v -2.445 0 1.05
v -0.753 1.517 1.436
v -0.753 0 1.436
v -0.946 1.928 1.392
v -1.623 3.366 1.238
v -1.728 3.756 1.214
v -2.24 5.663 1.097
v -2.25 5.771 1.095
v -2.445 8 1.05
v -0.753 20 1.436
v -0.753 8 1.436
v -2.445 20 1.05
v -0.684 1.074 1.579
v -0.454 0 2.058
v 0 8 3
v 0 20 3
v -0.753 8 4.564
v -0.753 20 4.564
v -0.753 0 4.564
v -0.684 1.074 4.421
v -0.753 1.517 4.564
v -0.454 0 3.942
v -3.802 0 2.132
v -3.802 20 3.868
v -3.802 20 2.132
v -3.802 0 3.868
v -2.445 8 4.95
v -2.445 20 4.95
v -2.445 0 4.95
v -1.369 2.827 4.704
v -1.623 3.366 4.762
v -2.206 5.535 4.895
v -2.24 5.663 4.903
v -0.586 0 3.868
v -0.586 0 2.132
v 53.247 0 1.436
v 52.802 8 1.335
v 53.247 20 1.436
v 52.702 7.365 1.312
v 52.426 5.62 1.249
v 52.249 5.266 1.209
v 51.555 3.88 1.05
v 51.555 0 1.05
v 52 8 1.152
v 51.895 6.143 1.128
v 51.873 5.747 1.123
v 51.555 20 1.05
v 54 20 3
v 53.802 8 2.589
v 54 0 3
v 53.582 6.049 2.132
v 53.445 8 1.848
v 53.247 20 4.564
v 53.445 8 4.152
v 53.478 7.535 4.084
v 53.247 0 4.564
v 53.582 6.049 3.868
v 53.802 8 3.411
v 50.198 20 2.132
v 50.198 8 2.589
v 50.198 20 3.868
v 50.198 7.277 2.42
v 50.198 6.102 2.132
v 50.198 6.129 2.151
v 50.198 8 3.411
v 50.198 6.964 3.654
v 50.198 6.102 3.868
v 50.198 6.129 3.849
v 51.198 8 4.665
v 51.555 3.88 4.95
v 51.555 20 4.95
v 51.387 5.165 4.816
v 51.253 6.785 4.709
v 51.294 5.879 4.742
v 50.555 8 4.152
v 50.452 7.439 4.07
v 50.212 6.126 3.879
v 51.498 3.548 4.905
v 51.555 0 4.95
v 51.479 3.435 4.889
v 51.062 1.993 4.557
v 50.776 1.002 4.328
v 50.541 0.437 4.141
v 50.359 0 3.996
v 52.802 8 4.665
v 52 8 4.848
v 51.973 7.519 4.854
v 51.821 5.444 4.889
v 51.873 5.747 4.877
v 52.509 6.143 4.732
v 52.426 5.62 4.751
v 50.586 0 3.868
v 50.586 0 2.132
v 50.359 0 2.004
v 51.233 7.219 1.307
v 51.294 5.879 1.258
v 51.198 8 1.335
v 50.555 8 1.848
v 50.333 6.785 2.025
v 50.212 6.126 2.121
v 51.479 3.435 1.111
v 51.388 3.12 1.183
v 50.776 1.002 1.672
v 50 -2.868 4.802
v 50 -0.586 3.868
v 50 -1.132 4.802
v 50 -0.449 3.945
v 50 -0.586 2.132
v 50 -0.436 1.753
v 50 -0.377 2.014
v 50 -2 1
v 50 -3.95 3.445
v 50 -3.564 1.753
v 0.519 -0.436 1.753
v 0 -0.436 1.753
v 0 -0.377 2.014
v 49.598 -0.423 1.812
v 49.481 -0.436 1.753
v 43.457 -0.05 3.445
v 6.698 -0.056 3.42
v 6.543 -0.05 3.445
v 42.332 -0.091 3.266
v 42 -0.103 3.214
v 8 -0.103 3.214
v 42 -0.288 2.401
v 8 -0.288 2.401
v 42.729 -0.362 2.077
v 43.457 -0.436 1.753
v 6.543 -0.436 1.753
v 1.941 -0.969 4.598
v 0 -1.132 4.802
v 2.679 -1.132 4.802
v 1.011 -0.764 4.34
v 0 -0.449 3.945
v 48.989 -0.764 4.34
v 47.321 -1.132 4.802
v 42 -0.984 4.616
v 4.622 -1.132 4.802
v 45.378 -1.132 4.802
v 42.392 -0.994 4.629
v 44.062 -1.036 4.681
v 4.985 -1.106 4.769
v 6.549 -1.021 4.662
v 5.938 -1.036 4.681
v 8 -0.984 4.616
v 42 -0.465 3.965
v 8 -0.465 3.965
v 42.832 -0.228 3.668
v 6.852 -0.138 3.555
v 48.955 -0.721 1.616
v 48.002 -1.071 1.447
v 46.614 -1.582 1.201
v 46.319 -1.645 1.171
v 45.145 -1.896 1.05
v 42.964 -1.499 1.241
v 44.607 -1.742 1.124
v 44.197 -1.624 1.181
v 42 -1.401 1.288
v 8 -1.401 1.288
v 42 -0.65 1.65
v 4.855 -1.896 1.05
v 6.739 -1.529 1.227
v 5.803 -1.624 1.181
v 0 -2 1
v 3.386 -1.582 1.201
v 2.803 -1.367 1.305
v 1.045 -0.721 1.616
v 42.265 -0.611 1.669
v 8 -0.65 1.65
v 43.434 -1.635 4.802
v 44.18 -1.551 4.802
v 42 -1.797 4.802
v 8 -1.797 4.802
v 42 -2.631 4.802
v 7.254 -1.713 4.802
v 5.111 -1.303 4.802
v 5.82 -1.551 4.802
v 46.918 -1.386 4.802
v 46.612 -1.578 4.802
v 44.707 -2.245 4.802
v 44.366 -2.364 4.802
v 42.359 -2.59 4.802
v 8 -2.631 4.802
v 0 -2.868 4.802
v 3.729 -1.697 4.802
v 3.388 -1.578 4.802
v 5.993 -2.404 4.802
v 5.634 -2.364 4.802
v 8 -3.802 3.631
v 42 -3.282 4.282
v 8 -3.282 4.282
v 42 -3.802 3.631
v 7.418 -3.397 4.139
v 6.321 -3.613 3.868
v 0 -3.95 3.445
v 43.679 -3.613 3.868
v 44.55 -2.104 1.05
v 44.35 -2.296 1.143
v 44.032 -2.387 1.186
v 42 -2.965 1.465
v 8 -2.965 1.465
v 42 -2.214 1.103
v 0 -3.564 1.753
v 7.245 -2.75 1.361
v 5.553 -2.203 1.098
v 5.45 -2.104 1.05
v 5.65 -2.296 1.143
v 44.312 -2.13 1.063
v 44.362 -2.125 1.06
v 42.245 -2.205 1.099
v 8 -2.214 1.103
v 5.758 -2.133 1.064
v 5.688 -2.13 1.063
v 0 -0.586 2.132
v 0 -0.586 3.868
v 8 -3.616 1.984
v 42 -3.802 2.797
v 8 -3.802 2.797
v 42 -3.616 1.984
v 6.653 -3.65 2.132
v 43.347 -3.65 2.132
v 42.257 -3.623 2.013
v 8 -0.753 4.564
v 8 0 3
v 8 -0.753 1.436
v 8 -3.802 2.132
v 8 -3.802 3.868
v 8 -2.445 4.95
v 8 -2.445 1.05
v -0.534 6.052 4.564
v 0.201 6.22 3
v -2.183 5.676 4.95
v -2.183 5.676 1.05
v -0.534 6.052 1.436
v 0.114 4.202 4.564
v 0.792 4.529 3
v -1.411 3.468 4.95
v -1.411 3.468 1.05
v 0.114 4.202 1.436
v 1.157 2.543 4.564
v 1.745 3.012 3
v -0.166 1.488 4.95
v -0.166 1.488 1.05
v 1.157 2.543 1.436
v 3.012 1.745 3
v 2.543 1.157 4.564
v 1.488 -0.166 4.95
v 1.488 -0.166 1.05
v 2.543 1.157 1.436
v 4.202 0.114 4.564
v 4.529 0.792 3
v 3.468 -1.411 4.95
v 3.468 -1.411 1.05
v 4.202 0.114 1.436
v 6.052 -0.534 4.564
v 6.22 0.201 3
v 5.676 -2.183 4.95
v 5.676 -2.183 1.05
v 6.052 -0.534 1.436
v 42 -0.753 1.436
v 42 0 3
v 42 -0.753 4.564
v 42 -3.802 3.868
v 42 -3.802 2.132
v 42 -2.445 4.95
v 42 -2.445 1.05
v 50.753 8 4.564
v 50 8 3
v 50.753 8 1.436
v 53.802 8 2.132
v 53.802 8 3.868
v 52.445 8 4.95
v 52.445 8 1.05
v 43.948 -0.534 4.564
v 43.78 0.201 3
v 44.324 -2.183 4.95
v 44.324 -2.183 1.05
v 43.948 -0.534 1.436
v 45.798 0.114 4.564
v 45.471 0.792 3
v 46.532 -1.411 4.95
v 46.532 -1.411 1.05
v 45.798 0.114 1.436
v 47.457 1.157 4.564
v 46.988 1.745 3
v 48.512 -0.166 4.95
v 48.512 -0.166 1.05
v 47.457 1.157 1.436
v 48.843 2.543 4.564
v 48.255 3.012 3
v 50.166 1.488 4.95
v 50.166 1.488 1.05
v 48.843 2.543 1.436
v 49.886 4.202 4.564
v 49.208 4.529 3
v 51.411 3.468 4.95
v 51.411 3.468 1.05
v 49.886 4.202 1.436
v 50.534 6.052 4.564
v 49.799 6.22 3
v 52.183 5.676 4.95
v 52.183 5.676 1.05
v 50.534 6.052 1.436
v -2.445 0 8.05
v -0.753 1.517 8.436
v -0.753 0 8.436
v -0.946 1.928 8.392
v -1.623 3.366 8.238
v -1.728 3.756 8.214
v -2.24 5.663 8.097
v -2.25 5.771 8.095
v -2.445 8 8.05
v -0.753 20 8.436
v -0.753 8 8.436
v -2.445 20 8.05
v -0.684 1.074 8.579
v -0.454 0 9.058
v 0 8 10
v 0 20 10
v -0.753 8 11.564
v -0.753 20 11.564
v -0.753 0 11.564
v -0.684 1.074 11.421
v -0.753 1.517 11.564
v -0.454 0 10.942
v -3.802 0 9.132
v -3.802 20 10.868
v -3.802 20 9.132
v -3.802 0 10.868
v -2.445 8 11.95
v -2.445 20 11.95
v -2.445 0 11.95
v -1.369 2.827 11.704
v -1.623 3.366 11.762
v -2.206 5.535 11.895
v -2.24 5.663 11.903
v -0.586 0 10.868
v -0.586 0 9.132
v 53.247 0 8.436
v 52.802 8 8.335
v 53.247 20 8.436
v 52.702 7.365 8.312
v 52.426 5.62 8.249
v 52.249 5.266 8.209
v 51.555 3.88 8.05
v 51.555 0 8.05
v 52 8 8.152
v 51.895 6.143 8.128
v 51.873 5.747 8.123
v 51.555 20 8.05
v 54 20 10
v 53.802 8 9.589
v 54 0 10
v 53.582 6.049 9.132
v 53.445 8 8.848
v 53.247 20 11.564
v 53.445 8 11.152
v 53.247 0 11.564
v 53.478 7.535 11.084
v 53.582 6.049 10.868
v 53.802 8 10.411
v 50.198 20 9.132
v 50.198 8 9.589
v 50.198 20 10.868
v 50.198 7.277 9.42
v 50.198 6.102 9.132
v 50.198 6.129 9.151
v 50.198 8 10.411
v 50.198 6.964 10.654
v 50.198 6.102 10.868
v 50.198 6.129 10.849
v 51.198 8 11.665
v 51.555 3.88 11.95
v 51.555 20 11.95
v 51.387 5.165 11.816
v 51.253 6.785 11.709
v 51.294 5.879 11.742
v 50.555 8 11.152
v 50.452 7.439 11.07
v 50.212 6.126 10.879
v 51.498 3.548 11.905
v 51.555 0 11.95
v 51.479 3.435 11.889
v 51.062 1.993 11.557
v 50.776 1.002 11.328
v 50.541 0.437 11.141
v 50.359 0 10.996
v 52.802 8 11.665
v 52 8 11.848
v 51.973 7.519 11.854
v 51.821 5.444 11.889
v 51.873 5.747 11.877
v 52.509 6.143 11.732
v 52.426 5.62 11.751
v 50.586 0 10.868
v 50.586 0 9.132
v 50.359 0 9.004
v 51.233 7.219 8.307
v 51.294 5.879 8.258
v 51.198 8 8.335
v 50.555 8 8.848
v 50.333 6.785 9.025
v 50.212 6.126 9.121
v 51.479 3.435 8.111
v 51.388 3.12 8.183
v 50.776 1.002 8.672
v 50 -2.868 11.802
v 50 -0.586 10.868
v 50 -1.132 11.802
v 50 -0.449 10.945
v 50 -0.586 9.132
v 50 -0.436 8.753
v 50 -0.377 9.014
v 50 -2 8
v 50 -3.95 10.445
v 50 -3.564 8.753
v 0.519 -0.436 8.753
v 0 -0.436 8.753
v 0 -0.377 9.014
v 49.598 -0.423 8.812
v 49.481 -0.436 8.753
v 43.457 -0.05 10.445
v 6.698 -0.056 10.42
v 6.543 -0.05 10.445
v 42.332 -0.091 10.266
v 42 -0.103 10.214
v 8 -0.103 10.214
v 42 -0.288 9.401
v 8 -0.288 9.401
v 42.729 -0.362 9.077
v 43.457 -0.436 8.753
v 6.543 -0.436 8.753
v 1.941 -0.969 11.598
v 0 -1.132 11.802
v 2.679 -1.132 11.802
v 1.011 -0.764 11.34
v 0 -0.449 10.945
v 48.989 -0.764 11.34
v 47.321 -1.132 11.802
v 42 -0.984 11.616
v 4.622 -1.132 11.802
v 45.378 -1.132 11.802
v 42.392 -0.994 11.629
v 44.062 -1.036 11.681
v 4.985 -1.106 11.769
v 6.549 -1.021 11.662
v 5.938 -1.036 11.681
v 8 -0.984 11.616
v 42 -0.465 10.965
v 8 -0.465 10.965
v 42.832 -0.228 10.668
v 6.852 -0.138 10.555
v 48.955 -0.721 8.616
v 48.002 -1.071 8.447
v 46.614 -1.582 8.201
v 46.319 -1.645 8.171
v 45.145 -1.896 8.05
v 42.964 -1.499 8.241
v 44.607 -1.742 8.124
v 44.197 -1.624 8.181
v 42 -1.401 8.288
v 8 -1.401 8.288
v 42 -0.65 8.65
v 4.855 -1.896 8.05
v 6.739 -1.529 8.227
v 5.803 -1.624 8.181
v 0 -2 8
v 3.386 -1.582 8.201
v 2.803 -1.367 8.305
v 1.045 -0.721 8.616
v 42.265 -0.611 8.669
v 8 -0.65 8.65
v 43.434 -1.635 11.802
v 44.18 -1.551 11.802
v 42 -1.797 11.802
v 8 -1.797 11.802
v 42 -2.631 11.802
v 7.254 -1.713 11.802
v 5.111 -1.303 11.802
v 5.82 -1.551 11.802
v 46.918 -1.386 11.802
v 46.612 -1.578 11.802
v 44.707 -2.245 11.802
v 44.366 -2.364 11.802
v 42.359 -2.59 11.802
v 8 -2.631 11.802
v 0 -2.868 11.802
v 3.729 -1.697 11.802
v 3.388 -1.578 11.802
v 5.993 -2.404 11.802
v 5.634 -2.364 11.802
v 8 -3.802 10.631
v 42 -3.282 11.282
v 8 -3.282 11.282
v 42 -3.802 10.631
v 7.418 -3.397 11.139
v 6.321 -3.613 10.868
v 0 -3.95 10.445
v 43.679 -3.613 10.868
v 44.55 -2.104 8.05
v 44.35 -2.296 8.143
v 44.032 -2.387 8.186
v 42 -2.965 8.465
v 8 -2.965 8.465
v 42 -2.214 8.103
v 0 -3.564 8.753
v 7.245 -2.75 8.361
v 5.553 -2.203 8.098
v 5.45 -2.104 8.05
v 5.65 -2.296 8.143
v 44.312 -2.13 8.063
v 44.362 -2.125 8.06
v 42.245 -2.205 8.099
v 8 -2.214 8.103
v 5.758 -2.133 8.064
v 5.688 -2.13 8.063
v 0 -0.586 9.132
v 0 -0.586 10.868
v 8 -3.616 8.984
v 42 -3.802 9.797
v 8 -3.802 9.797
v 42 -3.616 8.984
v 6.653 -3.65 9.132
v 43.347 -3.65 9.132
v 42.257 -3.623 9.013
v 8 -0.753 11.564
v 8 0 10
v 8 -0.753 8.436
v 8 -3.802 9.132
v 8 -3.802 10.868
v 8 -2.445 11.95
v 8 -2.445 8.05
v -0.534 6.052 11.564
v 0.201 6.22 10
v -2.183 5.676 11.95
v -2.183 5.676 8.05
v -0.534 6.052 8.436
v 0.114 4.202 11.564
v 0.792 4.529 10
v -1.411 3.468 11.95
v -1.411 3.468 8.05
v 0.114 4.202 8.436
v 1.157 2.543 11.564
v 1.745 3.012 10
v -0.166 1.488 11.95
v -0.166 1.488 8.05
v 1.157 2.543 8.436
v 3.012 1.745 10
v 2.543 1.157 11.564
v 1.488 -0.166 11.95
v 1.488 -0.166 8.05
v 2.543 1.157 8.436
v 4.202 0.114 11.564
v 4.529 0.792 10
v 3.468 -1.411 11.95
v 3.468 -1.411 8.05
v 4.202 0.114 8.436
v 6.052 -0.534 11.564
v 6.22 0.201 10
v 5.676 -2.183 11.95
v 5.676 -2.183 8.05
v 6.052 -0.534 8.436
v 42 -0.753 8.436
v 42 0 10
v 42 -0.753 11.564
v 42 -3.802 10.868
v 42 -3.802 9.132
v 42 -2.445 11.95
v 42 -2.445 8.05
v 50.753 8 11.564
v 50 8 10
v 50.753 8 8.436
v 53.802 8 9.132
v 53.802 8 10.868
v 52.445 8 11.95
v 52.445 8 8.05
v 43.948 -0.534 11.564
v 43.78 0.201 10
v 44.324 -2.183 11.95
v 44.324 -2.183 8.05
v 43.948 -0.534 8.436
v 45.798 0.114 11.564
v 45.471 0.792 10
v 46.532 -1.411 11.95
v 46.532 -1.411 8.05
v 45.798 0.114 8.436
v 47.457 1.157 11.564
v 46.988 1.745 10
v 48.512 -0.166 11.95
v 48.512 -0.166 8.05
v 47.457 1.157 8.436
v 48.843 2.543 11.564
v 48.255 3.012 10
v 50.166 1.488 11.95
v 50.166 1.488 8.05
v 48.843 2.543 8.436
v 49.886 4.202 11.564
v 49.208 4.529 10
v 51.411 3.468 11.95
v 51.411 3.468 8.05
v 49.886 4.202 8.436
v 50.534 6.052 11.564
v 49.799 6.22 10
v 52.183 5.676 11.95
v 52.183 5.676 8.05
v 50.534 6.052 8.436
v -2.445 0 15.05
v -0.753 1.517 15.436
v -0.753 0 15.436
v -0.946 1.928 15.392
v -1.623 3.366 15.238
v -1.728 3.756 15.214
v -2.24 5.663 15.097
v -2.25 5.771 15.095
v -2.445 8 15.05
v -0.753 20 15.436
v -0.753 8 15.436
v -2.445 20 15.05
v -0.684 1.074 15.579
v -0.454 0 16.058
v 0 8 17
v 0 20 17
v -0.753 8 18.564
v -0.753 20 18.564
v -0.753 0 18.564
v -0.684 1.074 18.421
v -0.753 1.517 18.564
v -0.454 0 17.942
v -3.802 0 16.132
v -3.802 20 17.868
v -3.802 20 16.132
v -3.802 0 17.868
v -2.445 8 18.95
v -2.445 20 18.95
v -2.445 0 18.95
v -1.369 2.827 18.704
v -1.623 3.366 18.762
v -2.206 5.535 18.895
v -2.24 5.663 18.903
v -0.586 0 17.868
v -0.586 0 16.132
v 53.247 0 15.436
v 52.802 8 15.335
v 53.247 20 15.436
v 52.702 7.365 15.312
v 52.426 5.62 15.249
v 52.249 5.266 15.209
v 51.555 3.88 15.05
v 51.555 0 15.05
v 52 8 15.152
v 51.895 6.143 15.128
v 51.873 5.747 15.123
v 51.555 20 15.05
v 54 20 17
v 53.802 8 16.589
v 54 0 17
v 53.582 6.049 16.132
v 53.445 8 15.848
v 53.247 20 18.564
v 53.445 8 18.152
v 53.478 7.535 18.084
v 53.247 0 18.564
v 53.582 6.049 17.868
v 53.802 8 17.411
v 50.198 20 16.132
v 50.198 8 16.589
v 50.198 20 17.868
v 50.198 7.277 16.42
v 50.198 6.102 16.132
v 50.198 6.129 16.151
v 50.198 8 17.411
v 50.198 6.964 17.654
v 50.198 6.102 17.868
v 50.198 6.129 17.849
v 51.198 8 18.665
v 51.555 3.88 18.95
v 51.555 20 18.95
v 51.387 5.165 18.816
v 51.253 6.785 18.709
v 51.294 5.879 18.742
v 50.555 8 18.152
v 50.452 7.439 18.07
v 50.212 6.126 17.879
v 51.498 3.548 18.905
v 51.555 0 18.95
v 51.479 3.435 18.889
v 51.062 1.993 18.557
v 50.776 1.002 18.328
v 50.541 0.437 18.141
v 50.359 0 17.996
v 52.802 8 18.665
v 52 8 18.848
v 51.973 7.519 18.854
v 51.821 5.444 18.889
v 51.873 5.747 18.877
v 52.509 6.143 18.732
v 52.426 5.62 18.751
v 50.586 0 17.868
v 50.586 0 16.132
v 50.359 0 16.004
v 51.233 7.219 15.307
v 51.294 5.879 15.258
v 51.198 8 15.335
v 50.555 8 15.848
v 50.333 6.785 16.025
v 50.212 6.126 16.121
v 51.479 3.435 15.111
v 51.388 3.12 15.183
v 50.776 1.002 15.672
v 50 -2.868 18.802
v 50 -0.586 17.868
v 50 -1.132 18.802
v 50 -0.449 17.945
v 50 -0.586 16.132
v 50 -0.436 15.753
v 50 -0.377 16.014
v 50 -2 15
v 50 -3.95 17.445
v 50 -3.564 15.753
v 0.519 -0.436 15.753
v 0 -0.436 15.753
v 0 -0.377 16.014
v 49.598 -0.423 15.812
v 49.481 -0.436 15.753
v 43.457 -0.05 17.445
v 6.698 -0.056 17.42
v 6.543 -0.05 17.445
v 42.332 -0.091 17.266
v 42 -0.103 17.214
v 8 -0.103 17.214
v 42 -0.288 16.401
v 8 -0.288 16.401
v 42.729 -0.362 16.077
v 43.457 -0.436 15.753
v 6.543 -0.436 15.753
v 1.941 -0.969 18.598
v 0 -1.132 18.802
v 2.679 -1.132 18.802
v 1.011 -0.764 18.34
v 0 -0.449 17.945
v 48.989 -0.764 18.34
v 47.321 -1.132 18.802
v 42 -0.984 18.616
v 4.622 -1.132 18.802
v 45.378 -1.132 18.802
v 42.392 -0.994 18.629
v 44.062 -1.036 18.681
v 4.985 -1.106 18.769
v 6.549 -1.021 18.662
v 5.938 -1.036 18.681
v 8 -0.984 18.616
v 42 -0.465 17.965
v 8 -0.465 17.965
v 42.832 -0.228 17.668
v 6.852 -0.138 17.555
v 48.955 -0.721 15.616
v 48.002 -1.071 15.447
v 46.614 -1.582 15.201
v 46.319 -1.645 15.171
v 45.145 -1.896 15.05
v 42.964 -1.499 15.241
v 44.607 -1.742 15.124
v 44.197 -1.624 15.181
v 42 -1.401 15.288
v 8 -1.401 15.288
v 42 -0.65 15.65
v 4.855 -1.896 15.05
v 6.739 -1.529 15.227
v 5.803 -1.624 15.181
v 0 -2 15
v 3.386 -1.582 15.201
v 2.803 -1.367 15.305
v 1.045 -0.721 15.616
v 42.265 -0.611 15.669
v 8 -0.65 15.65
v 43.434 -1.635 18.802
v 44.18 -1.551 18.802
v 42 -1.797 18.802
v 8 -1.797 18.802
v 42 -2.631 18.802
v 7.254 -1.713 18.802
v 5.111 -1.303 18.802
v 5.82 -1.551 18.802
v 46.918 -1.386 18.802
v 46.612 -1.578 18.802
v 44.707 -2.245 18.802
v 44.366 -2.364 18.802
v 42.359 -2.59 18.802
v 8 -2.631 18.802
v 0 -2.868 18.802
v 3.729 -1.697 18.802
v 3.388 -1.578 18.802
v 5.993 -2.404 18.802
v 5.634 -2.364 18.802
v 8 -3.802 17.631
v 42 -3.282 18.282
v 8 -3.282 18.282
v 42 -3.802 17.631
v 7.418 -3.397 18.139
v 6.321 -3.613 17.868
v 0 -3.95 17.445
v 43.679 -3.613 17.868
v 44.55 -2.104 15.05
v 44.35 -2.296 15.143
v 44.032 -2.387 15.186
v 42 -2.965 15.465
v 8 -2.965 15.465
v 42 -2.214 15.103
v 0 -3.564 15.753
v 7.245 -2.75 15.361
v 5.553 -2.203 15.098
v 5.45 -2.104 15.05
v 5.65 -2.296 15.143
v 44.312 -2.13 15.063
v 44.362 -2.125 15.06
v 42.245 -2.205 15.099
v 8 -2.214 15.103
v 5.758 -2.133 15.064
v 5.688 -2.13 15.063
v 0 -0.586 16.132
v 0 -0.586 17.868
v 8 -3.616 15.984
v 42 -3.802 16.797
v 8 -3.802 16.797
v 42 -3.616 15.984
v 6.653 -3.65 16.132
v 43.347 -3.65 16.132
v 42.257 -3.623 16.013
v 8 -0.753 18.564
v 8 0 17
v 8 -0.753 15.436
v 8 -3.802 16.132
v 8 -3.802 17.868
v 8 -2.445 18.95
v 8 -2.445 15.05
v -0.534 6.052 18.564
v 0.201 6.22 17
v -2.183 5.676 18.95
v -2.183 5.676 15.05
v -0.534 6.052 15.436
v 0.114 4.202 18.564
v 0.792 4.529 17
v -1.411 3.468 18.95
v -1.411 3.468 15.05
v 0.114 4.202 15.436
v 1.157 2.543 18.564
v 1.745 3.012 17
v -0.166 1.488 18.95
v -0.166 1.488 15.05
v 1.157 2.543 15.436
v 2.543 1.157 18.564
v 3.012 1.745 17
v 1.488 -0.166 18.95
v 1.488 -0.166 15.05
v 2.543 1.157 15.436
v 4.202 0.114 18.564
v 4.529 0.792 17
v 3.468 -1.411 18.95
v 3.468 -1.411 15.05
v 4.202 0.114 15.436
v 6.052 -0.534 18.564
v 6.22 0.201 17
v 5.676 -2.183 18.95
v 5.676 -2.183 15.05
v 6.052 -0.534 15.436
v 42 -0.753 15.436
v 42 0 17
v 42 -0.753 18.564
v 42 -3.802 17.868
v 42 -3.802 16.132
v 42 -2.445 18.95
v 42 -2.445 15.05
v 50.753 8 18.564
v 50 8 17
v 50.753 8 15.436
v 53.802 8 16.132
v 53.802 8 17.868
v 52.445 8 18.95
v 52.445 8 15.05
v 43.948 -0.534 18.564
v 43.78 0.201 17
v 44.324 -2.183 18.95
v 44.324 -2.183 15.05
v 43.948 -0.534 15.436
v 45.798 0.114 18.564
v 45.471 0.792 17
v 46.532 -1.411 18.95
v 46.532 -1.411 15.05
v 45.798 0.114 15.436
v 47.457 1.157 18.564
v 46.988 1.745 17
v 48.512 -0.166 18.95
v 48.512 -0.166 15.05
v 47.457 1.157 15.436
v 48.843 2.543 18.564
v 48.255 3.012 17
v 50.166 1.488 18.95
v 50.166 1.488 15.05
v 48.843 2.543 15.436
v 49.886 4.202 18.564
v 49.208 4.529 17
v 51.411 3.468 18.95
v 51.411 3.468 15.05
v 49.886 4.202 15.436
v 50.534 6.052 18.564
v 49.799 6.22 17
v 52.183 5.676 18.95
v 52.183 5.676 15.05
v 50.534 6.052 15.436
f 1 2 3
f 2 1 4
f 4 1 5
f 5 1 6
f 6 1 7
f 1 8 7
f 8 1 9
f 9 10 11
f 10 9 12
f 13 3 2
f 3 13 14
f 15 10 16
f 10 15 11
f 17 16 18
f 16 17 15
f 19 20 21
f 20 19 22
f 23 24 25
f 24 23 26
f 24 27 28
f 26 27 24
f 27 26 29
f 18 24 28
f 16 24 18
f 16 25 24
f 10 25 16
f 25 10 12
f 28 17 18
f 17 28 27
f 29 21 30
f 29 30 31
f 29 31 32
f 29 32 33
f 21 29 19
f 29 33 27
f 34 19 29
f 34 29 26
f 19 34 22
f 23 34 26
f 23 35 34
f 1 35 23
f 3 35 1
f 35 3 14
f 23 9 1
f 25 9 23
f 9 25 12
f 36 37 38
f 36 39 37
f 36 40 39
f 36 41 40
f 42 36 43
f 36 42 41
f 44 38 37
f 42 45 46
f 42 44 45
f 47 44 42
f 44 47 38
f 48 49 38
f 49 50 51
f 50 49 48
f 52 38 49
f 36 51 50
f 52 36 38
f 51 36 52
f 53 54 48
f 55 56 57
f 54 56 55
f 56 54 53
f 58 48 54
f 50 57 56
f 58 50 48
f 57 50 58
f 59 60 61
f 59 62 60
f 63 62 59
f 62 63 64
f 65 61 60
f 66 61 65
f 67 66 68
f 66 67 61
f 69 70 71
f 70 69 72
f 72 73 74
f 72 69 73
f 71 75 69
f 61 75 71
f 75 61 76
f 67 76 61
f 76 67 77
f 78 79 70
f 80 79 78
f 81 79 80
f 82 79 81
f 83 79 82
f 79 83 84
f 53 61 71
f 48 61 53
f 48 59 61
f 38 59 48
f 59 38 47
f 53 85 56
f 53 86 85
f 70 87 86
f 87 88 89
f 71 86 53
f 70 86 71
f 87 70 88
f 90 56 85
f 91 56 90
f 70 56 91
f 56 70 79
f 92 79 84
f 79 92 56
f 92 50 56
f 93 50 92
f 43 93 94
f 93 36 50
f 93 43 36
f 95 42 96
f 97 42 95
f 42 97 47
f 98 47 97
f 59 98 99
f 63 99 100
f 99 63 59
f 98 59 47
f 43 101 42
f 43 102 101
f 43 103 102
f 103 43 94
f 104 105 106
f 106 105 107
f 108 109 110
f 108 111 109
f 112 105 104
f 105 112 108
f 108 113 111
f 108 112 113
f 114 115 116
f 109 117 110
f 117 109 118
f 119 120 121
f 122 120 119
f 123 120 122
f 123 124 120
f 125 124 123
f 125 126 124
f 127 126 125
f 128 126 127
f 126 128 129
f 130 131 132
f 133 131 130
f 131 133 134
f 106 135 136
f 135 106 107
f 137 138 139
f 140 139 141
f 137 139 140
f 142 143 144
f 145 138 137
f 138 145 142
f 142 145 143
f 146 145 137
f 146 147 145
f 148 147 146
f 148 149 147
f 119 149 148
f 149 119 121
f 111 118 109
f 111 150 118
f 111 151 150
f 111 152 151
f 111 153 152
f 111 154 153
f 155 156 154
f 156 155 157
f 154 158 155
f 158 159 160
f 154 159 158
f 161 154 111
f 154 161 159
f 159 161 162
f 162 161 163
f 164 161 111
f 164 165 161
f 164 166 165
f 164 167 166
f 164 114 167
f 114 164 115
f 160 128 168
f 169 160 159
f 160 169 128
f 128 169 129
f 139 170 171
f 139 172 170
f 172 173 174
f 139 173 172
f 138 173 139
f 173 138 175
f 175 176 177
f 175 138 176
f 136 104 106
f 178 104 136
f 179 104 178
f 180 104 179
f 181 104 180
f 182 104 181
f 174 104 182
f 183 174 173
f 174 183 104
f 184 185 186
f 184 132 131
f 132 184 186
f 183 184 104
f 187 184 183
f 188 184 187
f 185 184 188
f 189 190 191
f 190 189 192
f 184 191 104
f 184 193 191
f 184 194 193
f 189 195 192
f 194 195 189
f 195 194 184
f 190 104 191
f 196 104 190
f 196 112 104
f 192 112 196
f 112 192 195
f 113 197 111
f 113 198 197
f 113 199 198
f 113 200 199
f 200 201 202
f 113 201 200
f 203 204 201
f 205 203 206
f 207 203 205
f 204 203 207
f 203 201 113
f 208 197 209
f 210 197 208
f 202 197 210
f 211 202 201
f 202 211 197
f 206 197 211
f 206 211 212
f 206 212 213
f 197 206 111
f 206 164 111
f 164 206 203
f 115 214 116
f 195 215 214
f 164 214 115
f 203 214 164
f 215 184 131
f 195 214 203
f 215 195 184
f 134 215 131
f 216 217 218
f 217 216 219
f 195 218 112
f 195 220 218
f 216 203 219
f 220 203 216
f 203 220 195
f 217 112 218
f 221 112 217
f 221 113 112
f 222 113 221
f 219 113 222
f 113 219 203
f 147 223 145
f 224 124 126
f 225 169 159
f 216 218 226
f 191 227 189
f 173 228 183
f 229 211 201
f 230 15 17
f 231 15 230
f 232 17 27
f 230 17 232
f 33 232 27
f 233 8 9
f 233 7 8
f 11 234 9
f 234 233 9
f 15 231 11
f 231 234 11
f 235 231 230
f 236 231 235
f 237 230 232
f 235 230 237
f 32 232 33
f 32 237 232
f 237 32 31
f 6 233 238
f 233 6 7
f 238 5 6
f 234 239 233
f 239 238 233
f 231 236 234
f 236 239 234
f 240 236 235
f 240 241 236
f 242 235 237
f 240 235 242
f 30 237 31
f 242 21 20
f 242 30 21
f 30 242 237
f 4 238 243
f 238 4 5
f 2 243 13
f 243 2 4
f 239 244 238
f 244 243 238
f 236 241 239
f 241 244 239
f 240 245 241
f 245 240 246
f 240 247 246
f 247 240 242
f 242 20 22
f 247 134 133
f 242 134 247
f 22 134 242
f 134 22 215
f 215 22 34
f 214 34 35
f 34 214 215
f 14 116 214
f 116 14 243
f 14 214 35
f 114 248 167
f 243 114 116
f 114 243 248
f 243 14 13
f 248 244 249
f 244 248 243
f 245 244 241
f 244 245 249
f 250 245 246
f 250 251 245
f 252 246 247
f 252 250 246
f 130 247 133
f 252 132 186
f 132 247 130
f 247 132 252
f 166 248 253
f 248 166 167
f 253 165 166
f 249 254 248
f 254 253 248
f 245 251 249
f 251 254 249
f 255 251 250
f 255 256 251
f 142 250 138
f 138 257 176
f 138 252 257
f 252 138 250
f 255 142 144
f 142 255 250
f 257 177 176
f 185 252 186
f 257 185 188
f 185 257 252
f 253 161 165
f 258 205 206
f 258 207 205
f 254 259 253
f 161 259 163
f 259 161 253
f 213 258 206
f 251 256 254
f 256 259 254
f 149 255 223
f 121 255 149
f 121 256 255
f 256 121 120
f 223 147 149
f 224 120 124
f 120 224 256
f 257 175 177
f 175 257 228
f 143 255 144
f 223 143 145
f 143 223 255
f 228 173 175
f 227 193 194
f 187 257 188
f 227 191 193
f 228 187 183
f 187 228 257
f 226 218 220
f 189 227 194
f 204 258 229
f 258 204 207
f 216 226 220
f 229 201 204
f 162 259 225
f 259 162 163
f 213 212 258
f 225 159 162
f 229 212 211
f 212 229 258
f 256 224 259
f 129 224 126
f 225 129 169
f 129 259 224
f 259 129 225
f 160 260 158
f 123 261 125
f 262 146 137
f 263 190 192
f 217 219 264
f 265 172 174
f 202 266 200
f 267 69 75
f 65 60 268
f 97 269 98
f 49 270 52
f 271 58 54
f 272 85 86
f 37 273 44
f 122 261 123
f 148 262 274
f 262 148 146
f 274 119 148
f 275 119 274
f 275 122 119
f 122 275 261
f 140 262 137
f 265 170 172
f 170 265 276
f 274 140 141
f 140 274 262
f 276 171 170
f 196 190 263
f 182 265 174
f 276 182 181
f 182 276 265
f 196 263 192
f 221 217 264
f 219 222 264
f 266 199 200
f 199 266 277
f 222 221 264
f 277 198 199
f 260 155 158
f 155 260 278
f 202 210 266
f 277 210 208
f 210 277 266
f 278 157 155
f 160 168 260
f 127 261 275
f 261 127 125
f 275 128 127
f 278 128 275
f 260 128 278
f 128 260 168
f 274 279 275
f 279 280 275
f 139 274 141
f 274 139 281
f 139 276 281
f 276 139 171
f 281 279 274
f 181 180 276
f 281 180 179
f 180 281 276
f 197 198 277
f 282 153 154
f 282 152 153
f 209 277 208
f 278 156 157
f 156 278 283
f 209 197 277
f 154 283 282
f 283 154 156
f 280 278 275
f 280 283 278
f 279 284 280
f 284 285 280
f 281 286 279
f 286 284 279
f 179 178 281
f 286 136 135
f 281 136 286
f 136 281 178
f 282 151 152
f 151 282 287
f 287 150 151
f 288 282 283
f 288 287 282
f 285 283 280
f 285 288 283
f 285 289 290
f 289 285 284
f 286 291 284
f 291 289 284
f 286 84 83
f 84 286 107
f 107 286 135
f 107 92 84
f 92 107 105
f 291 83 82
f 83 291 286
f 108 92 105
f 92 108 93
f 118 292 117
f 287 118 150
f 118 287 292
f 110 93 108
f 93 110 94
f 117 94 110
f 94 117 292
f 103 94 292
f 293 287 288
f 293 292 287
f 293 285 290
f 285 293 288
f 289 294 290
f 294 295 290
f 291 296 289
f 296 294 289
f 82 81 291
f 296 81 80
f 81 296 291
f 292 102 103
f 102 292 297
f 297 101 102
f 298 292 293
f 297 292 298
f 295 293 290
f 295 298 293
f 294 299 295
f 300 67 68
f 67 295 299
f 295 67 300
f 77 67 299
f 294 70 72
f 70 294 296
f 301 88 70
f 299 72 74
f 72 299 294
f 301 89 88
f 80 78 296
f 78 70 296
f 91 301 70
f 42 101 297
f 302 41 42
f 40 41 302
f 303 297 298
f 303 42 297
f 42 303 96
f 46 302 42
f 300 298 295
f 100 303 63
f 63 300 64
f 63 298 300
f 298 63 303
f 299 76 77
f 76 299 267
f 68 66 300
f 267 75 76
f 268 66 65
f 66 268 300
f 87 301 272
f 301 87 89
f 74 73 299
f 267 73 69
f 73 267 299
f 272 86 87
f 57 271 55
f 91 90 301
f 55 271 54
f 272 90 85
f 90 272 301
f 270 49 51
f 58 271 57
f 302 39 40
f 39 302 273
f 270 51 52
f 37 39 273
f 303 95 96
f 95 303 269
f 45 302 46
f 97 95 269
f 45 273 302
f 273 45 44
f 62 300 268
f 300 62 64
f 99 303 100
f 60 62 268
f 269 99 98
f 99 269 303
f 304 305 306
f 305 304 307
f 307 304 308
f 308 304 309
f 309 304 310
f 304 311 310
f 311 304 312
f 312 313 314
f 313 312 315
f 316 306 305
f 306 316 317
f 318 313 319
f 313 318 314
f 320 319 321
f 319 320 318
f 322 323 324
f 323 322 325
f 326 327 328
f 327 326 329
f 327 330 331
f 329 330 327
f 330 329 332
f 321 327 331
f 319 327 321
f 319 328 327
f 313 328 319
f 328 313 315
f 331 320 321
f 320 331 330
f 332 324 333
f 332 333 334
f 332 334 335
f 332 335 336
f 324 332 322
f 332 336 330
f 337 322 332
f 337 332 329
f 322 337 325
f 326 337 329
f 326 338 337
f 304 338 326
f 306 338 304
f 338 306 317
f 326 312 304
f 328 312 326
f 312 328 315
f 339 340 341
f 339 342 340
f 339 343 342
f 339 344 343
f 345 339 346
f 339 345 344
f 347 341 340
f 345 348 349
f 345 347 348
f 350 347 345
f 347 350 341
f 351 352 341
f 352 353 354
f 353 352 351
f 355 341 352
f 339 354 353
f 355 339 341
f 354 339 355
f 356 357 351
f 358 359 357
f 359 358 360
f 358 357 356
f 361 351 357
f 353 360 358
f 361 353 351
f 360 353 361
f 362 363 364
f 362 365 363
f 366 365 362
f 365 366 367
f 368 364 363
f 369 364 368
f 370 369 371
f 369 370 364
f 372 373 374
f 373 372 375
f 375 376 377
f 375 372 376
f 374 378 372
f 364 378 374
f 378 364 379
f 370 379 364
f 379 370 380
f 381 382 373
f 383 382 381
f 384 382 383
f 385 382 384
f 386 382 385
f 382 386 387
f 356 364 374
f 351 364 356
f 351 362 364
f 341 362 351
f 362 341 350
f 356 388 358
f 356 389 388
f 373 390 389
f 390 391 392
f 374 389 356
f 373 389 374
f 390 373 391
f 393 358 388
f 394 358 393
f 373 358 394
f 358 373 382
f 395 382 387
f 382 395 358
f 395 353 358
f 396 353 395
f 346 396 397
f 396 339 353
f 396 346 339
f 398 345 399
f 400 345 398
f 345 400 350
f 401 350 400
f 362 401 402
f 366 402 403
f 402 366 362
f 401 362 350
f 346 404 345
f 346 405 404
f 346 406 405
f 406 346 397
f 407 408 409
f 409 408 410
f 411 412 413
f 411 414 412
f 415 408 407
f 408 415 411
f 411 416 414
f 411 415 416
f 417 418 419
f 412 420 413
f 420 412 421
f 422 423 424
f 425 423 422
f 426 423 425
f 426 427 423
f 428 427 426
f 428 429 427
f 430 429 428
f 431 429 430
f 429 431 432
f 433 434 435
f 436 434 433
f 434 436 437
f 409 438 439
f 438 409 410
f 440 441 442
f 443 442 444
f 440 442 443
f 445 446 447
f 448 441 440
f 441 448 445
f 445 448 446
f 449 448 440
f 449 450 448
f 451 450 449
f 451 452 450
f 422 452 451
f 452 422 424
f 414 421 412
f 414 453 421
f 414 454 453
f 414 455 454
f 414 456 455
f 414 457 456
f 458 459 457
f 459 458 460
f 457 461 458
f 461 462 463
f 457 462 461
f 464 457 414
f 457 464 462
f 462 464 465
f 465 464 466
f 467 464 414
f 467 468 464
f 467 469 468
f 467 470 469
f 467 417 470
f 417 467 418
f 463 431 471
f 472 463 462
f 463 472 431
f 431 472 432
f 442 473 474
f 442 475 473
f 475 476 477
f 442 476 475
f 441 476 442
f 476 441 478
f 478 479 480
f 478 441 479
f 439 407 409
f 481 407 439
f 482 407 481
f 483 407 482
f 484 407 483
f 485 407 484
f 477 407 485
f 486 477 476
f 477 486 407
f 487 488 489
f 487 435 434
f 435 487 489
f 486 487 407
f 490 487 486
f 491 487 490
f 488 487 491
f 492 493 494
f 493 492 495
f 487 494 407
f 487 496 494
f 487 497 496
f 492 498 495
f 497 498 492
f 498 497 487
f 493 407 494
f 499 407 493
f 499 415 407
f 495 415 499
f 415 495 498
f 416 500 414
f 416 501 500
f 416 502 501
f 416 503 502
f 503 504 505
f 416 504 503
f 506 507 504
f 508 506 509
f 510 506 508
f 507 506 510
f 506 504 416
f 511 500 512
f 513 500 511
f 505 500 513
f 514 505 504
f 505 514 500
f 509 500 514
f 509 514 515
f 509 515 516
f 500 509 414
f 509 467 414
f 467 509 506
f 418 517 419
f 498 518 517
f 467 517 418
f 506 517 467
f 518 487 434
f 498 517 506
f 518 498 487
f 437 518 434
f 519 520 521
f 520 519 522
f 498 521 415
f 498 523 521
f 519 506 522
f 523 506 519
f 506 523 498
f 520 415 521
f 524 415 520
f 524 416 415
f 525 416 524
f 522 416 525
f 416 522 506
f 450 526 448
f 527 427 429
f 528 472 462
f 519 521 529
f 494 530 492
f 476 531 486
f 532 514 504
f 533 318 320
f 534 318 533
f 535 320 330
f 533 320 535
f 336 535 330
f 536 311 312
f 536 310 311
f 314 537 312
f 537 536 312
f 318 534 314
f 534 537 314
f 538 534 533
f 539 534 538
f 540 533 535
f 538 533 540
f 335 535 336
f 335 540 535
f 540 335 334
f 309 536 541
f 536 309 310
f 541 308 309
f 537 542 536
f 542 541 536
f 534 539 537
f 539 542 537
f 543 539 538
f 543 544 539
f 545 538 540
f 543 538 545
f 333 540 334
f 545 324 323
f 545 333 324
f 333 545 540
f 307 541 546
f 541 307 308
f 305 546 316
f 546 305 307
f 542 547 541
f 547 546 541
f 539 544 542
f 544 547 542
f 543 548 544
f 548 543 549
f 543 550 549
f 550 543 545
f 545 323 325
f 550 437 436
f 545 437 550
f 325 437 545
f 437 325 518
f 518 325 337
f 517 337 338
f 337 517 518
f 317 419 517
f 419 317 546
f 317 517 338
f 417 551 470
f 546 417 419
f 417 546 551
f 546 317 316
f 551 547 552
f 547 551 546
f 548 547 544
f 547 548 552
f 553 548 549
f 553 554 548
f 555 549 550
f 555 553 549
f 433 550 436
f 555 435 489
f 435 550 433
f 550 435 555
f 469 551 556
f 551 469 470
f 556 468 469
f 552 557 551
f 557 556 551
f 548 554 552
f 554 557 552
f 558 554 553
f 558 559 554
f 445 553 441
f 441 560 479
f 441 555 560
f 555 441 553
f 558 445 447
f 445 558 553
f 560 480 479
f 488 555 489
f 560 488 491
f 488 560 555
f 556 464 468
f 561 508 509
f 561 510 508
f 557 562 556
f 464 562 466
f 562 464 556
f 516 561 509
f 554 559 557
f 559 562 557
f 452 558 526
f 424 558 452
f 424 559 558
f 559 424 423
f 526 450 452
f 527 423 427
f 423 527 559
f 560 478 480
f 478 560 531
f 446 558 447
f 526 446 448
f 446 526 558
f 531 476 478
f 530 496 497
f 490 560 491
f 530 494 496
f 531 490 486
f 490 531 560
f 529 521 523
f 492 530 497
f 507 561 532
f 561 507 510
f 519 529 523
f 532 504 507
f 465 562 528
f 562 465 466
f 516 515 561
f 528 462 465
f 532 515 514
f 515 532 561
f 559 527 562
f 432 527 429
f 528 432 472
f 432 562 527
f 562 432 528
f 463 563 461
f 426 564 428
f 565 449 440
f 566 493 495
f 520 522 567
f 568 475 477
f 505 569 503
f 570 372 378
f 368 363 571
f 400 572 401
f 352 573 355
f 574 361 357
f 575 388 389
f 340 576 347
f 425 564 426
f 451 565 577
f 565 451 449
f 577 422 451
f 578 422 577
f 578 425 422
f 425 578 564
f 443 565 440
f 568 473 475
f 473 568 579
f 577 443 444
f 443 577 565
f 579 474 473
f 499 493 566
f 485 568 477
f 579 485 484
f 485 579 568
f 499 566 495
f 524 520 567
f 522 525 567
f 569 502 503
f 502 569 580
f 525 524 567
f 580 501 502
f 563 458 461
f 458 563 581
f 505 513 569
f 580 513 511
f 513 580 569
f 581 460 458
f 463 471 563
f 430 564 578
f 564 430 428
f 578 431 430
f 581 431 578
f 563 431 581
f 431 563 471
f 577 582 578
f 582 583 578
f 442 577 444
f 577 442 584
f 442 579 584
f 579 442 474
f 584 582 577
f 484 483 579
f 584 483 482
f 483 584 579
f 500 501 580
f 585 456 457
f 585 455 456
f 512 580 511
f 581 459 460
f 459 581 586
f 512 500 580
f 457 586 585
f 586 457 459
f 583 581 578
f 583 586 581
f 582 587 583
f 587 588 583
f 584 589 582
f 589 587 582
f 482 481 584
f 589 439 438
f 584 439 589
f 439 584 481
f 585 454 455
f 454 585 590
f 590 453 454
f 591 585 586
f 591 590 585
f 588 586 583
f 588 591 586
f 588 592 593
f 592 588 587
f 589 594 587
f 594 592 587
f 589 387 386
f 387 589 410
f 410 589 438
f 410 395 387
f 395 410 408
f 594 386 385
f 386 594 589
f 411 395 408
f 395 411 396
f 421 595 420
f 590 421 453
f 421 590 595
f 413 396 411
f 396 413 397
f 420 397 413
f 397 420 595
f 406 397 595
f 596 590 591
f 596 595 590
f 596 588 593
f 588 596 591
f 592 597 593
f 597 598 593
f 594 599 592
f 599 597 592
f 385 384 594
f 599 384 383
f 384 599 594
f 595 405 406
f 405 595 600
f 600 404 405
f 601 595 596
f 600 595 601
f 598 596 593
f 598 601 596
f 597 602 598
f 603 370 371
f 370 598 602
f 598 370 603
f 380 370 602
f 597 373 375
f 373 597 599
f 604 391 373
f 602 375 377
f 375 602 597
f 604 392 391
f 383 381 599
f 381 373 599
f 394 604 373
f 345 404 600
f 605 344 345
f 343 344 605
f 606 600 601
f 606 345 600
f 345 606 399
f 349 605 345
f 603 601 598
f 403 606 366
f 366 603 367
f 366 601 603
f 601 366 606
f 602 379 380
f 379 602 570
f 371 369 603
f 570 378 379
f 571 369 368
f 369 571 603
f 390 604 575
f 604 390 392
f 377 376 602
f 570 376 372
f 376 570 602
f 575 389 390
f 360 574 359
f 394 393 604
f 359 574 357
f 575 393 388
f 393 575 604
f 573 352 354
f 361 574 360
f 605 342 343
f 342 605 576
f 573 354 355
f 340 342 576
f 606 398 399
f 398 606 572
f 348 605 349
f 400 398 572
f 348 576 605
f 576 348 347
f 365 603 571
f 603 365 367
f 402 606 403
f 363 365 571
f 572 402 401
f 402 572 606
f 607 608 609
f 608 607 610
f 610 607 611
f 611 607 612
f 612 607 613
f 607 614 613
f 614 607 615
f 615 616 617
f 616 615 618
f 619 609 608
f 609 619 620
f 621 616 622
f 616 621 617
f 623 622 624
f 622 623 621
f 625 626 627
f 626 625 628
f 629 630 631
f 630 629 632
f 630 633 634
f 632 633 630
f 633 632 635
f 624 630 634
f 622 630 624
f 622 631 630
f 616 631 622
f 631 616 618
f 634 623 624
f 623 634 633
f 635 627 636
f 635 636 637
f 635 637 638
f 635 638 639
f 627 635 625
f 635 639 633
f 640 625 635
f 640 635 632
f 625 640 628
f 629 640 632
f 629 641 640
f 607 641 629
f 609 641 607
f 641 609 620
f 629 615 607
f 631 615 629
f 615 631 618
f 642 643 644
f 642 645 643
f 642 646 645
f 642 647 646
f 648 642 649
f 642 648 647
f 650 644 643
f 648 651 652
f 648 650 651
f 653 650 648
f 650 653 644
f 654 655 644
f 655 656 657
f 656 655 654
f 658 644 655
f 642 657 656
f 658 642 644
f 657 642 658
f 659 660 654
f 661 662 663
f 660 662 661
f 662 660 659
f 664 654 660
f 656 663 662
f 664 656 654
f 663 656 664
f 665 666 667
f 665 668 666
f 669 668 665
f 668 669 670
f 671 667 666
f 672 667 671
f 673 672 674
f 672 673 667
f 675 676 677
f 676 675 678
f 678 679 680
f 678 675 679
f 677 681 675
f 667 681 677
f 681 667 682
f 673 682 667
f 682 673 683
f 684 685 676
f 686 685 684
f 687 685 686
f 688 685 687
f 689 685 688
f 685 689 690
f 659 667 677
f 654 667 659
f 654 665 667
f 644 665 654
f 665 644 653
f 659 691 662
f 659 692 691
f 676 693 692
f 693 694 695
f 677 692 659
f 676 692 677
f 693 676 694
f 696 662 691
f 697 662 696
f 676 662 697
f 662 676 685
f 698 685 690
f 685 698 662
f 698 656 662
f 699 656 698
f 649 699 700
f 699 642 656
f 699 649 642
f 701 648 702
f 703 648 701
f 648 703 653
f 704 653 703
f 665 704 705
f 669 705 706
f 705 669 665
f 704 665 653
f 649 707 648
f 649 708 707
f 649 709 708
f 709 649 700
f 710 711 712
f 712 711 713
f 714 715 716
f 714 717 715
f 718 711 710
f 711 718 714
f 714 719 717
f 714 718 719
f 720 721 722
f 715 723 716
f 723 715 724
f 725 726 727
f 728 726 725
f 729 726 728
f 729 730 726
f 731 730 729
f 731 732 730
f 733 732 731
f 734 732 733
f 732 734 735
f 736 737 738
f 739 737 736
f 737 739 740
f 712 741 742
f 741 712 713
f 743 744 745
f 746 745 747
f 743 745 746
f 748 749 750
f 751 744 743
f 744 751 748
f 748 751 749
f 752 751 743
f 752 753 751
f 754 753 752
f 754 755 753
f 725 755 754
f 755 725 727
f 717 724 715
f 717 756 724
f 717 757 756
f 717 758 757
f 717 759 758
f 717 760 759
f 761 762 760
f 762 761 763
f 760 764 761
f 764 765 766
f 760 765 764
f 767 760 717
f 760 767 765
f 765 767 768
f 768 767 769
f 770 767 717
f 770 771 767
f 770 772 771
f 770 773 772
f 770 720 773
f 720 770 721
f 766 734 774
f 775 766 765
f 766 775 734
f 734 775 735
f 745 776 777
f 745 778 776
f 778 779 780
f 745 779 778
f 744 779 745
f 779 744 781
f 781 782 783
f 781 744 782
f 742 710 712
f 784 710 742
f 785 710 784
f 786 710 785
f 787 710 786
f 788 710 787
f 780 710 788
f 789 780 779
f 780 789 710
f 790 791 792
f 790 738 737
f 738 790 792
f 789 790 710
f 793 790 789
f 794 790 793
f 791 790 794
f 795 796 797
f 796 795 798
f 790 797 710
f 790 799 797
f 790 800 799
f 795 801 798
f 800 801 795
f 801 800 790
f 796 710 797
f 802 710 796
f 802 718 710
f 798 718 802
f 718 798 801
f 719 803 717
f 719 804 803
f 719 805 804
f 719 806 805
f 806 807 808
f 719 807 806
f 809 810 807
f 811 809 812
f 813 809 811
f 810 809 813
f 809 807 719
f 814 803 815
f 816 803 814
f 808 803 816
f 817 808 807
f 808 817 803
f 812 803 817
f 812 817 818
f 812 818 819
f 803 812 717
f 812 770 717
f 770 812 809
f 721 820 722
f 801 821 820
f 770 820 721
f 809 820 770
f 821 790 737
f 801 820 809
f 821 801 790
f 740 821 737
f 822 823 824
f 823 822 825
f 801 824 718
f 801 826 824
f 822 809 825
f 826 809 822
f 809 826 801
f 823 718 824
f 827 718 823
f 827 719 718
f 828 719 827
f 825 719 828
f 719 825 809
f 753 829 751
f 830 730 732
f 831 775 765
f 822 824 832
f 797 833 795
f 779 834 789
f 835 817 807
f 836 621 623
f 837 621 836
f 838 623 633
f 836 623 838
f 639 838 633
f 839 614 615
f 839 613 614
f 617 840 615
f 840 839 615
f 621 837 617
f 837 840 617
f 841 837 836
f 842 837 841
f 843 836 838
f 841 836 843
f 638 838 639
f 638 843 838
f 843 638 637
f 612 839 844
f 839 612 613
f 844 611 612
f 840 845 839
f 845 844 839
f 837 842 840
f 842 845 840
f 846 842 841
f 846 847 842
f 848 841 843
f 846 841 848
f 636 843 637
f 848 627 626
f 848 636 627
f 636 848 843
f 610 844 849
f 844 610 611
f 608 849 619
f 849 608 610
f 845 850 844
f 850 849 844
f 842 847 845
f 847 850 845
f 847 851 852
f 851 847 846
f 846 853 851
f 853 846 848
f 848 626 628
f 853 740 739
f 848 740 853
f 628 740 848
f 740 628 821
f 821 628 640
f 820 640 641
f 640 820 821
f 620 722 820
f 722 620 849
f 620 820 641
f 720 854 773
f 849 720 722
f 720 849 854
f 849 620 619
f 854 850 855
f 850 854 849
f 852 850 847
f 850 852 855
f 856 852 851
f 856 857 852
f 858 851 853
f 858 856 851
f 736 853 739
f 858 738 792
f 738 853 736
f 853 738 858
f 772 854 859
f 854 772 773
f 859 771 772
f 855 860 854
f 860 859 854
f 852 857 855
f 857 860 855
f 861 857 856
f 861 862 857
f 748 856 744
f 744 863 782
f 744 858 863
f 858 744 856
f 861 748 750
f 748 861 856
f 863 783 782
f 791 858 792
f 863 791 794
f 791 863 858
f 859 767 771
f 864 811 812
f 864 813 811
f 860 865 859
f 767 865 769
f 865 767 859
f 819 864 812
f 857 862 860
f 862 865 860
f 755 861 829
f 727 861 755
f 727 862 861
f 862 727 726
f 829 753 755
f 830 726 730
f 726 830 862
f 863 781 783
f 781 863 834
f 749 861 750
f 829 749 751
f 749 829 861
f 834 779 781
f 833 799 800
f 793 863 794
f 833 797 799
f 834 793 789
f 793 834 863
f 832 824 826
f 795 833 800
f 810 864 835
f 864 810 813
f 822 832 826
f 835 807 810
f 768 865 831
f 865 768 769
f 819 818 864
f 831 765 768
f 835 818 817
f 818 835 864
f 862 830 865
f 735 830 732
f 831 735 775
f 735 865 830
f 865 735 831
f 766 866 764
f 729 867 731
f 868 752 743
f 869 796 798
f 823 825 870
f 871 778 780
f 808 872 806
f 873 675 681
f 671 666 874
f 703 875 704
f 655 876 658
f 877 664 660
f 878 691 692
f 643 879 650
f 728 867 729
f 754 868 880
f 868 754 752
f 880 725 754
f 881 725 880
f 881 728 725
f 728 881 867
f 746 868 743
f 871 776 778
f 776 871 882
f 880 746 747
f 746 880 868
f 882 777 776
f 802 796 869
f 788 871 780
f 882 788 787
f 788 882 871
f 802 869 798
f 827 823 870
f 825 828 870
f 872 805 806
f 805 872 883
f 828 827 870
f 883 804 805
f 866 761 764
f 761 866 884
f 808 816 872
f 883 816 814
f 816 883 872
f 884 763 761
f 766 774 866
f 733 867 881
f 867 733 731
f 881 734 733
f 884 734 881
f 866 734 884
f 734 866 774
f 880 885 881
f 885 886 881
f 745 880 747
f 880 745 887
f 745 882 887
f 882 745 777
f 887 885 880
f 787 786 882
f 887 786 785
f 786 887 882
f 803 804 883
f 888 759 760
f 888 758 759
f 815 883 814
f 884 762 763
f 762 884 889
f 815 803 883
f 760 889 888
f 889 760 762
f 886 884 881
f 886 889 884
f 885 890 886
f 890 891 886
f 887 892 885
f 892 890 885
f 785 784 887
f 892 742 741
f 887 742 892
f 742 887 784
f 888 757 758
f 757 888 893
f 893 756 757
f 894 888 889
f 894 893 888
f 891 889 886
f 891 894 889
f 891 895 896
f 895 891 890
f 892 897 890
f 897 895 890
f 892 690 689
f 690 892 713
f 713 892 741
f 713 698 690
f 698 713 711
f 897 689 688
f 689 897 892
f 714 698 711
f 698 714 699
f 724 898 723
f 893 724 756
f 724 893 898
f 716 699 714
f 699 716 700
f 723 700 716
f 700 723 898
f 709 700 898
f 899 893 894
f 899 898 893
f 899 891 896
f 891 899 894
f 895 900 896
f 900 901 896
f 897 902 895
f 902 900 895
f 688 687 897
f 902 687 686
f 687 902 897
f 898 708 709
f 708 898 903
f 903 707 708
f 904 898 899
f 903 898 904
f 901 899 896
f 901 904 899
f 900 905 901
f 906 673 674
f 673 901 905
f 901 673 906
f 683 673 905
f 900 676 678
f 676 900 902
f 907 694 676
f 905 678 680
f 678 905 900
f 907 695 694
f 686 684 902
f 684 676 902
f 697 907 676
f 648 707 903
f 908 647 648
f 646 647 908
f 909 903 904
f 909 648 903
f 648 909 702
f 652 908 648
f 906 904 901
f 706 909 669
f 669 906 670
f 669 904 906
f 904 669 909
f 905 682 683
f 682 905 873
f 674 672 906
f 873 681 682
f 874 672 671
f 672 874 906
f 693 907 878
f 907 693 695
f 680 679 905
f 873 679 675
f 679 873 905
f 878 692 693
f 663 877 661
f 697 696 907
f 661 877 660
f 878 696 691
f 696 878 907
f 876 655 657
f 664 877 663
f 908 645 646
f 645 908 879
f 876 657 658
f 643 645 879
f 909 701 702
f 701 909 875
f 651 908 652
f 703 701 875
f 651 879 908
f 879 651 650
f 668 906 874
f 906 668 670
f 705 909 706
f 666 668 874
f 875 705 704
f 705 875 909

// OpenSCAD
// file: accent/accent.scad
module left_side_accent(width, radius, offset=0) {
    translate([-offset, 0, 0]) {
        rotate(a=-90, v=[1, 0, 0]) {
            cylinder(r=radius, h=width);
        }
    }
}

module right_side_accent(length, width, radius, offset=0) {
    translate([offset, 0, 0]) {
        translate([length, 0, 0]) {
            left_side_accent(
                width=width,
                radius=radius
            );
        }
    }
}

module front_accent(length, radius, offset=0) {
    translate([0, -offset, 0]) {
        rotate(a=90, v=[0, 1, 0]) {
            cylinder(r=radius, h=length);
        }
    }
}

module left_curved_accent(edge_radius, radius, offset=0) {
    translate([-offset, -offset, 0]) {
        translate([edge_radius, edge_radius, 0]) {
            rotate_extrude(angle=90) {
                translate([-edge_radius, 0, 0]) {
                    circle(r=radius);
                }
            }
        }
    }
}

module right_curved_accent(length, edge_radius, radius, offset=0) {
    translate([offset, -offset, 0]) {
        translate([length, 0, 0]) {
            rotate(a=90, v=[0, 0, 1]) {
                left_curved_accent(
                    edge_radius=edge_radius,
                    radius=radius
                );
            }
        }
    }
}

module accent(length, width, edge_radius, radius, offset=0) {
    left_side_accent(
        width=width,
        radius=radius,
        offset=offset
    );

    right_side_accent(
        length=length,
        width=width,
        radius=radius,
        offset=offset
    );

    front_accent(
        length=length,
        radius=radius,
        offset=offset
    );

    left_curved_accent(
        edge_radius=edge_radius,
        radius=radius,
        offset=offset
    );

    right_curved_accent(
        length=length,
        edge_radius=edge_radius,
        radius=radius,
        offset=offset
    );
}
// file: accents.scad
use <accent/accent.scad>

module accents(length, width, height, edge_radius, radius, count, margin, offset=0) {
    // 2 accents are required so that margin makes sense from top and bottom
    assert(count>=2, "Must have at least two accents!");

    top_accent_height = height-margin;
    // how much height the accents cover
    accent_height = height-margin*2;
    accent_spacing = accent_height/(count-1);

    for (i = [0 : count-1]) {
        this_accent_height = margin + i*accent_spacing;

        translate([0, 0, this_accent_height]) {
            accent(
                length=length,
                width=width,
                edge_radius=edge_radius,
                radius=radius,
                offset=offset
            );
        }
    }

}
// main file
use <accents.scad>

length=50;
width=20;
height=20;
edge_radius=10;
radius=2;
count=3;
margin=3;
offset=2;

accents(
    length=length,
    width=width,
    height=height,
    edge_radius=edge_radius,
    radius=radius,
    count=count,
    margin=margin,
    offset=offset
);
